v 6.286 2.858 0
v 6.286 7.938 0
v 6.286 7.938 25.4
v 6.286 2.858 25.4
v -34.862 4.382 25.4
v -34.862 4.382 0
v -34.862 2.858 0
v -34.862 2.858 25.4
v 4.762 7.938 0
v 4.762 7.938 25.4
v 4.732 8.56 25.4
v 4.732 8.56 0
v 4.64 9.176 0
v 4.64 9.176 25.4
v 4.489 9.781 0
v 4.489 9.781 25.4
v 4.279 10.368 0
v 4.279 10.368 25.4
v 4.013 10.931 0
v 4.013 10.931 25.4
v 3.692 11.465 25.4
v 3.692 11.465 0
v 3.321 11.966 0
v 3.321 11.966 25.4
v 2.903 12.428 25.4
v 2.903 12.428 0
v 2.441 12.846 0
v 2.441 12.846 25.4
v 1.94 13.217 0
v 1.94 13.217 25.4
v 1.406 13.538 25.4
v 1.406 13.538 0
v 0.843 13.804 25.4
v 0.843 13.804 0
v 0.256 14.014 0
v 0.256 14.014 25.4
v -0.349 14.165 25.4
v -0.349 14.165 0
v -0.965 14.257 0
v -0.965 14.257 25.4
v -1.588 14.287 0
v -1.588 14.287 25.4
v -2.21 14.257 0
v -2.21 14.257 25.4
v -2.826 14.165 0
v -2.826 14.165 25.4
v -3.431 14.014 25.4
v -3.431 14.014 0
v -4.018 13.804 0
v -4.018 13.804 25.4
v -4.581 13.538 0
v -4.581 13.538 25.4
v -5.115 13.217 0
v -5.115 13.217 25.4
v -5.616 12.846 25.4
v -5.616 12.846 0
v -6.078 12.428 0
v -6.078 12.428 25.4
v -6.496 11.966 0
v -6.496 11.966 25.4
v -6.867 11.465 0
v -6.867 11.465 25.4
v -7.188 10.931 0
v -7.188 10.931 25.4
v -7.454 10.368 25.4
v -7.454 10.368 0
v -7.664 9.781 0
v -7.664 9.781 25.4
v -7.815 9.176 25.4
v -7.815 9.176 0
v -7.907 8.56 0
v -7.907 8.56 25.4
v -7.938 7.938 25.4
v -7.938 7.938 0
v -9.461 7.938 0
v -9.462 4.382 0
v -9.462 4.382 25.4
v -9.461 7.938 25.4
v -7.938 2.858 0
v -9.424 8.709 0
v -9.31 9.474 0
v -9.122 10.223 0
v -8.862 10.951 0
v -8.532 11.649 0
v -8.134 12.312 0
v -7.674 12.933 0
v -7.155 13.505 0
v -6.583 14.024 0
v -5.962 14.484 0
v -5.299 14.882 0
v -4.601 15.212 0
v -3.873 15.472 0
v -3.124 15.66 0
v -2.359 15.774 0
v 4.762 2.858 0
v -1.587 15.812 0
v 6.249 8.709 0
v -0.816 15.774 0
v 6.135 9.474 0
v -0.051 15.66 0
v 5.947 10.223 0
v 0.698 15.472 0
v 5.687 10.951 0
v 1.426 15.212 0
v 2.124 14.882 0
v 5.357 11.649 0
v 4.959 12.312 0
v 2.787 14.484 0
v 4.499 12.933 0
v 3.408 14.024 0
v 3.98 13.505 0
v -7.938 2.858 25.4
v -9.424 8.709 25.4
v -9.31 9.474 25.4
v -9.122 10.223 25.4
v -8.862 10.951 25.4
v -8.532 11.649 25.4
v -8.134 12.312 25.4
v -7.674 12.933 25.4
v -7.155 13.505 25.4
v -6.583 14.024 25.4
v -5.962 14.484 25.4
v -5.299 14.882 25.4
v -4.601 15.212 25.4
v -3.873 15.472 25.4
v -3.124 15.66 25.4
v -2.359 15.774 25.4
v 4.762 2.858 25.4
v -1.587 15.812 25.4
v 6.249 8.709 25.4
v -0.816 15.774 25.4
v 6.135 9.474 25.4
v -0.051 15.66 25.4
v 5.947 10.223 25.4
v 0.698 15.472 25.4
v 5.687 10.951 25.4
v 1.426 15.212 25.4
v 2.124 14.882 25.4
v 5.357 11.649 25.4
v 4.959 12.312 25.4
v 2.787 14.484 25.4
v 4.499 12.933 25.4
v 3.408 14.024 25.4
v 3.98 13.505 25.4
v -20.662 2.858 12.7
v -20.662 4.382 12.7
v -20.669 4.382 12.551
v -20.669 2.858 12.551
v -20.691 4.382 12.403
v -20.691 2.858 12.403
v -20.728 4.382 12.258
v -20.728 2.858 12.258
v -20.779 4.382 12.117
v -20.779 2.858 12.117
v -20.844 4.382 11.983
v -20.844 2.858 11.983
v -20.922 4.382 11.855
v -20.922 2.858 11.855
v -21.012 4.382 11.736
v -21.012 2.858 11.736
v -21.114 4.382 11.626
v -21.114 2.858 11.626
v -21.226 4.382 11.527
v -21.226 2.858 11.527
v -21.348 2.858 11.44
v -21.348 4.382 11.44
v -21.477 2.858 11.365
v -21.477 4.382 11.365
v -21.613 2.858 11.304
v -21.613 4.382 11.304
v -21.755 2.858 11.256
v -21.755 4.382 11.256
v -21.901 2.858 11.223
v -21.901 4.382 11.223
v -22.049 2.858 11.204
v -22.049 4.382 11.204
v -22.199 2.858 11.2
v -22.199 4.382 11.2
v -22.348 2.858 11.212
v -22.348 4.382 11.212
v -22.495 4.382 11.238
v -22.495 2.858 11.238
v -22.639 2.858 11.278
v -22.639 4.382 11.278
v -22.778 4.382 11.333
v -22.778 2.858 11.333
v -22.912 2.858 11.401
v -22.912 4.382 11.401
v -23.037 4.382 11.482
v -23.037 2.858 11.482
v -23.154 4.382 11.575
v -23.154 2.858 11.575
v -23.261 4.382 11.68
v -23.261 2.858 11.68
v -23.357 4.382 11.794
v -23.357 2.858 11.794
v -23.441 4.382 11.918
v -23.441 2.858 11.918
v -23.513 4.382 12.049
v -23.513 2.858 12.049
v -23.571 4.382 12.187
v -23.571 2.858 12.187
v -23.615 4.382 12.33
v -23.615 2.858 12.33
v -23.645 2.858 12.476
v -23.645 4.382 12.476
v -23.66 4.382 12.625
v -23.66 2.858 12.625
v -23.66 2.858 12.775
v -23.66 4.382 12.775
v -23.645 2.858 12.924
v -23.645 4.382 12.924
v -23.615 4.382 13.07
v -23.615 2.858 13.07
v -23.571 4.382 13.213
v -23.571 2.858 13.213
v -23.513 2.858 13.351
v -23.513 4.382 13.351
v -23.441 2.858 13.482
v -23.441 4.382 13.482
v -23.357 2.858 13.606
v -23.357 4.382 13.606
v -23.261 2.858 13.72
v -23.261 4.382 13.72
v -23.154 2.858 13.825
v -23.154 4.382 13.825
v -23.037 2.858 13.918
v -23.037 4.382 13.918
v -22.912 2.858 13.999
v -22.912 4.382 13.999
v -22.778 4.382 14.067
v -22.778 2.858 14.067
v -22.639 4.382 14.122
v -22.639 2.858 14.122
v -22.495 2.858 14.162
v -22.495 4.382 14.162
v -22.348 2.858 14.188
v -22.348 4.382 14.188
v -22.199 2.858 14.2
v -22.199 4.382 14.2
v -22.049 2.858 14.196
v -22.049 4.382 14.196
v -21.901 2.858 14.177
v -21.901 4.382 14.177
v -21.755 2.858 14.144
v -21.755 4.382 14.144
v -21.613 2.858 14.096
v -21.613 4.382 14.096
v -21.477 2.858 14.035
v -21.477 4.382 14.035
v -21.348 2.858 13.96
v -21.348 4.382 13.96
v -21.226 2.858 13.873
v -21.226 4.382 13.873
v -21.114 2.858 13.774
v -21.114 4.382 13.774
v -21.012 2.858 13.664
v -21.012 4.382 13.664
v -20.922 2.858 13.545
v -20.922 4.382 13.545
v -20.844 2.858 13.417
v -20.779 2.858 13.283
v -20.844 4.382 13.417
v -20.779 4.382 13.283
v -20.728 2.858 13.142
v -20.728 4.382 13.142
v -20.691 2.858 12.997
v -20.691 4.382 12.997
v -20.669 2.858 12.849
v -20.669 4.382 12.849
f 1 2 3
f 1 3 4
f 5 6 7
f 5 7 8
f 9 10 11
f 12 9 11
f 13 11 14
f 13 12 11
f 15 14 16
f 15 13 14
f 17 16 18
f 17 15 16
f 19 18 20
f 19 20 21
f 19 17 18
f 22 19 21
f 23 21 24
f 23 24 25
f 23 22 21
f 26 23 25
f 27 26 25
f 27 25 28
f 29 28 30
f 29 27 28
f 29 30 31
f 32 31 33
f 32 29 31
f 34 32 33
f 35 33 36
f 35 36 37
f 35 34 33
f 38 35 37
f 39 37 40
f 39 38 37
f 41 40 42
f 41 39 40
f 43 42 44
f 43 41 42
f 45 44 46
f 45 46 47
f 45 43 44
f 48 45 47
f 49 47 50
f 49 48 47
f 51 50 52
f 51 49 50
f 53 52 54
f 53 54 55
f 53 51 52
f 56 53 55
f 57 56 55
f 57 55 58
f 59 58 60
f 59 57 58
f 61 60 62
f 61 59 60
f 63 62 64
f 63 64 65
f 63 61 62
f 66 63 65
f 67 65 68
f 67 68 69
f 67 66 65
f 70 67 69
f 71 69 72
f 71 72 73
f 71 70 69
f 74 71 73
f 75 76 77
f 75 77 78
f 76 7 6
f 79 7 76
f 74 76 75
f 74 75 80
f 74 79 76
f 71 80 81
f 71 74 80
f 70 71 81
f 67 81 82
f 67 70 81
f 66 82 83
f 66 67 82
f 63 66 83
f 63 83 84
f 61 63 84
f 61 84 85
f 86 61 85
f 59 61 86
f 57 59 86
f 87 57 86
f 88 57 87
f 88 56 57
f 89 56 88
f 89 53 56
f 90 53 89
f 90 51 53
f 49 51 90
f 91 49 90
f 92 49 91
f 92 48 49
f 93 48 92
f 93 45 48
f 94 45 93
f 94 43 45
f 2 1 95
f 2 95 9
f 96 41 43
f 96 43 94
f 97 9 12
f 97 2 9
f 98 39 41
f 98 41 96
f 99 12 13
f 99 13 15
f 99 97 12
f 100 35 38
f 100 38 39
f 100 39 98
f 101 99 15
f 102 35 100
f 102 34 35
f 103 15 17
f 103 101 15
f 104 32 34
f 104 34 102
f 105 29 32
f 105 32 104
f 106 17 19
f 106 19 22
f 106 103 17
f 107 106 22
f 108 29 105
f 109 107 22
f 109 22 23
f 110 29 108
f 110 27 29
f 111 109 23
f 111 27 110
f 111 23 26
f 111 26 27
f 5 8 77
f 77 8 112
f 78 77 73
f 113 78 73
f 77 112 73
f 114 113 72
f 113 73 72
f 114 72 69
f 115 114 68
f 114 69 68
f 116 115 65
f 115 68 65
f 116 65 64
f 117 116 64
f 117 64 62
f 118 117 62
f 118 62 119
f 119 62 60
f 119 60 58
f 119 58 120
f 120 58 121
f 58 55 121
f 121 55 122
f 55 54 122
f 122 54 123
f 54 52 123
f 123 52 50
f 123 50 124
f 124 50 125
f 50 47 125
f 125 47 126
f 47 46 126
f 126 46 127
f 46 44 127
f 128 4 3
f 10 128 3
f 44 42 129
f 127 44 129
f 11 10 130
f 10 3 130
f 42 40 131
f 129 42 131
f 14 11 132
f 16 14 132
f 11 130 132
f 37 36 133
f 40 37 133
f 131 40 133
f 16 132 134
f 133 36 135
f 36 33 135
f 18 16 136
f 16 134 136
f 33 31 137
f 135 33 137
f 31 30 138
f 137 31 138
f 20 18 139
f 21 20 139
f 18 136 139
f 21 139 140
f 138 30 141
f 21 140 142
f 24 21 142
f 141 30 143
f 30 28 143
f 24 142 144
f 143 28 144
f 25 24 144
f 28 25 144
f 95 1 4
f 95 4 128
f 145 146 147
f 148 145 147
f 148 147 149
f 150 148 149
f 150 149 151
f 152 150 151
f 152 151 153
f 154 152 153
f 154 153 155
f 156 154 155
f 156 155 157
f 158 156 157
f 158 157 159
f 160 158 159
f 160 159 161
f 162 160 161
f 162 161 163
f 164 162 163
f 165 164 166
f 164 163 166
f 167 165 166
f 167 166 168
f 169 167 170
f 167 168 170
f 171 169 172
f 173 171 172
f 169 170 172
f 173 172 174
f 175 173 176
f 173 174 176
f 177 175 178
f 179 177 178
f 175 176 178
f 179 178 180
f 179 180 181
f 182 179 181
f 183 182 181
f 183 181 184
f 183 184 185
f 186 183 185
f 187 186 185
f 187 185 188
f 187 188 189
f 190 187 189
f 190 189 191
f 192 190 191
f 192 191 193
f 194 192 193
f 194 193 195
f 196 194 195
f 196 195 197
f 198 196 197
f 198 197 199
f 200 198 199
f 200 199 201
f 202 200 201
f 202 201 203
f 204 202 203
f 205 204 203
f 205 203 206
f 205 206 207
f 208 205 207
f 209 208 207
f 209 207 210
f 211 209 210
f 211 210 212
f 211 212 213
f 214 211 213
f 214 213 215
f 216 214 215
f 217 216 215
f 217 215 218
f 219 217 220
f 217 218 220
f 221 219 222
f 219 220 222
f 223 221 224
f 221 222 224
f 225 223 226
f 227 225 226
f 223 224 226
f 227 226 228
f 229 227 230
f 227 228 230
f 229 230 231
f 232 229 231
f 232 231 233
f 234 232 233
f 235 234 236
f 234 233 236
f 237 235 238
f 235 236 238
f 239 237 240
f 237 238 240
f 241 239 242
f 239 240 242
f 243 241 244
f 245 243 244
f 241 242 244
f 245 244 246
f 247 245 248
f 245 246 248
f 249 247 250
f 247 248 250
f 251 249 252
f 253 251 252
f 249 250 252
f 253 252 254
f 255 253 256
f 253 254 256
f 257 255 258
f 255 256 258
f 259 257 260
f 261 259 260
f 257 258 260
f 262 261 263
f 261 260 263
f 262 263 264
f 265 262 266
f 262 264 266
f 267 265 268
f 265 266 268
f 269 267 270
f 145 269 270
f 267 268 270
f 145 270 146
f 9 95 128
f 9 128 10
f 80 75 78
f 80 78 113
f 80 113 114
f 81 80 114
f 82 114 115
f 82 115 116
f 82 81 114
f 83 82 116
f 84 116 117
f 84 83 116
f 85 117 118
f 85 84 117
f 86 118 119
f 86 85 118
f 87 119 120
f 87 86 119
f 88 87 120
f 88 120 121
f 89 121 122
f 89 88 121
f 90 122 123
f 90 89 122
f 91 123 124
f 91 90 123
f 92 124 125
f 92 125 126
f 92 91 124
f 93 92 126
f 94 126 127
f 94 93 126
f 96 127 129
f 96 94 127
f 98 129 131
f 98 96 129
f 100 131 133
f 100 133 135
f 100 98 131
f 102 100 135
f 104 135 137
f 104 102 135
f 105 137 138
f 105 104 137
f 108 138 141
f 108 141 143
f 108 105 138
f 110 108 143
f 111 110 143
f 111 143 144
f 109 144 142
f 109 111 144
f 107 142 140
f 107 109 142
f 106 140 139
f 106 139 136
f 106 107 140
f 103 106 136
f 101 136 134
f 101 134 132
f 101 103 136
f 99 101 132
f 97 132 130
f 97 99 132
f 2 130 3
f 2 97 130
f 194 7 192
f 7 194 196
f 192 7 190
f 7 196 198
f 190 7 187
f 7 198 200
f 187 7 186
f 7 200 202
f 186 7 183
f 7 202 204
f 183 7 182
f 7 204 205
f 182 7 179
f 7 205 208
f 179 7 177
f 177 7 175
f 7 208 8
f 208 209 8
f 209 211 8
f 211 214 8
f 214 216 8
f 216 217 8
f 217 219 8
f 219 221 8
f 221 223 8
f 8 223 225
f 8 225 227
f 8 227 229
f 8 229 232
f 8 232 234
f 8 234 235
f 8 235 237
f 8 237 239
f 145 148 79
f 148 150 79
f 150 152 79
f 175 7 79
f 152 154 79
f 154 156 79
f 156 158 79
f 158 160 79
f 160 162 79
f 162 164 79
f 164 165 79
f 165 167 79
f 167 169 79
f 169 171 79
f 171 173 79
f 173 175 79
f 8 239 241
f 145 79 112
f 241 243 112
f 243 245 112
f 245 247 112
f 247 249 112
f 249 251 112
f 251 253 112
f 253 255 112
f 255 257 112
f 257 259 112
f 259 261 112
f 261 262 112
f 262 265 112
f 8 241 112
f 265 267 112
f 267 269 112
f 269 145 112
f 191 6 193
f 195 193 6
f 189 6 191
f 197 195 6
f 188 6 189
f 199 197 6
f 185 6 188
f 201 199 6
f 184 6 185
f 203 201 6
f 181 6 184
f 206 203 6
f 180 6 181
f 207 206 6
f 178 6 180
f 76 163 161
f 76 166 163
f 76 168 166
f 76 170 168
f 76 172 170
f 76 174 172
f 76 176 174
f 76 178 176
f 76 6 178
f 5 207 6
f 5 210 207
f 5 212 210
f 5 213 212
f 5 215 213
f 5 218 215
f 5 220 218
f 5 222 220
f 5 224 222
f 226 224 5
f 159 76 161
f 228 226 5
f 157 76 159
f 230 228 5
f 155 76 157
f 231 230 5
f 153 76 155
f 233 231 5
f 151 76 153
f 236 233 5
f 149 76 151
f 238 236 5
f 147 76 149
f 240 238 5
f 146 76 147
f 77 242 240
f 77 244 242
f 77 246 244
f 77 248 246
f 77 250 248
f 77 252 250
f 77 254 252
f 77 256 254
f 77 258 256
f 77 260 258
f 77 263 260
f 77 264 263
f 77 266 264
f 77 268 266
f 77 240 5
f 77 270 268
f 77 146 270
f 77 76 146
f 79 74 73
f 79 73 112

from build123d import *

# Parameters (mm, degrees)
BOSS_EXTRUDE1_DEPTH = 25.4
SKETCH2_W           = 25.4
SKETCH2_H           = 1.524
BOSS_EXTRUDE2_DEPTH = 25.4
SKETCH5_R           = 1.5
CUT_EXTRUDE1_DEPTH  = 2.54


with BuildPart() as part:
    # Sketch1 → Boss-Extrude1 (new body)
    with BuildSketch(Plane(origin=(0, 0, 0), x_dir=(-1, 0, 0), z_dir=(0, 0, -1))):
        with BuildLine():
            Line((7.9375, 2.8575), (9.4615, 2.8575))
            Line((9.4615, 2.8575), (9.4615, 7.9375))
            ThreePointArc((9.4615, 7.9375), (1.5875, 15.8115), (-6.2865, 7.9375))
            Line((-6.2865, 7.9375), (-6.2865, 2.8575))
            Line((-6.2865, 2.8575), (-4.7625, 2.8575))
            Line((-4.7625, 2.8575), (-4.7625, 7.9375))
            ThreePointArc((-4.7625, 7.9375), (1.5875, 14.2875), (7.9375, 7.9375))
            Line((7.9375, 7.9375), (7.9375, 2.8575))
        make_face()
    extrude(amount=-BOSS_EXTRUDE1_DEPTH)

    # Sketch2 → Boss-Extrude2 (add)
    with BuildSketch(Plane.ZY.offset(9.4615)):
        with Locations((12.7, 3.6195)):
            Rectangle(SKETCH2_W, SKETCH2_H)
    extrude(amount=BOSS_EXTRUDE2_DEPTH)

    # Sketch5 → Cut-Extrude1 (cut)
    with BuildSketch(Plane(origin=(0, 4.3815, 0), x_dir=(1, 0, 0), z_dir=(0, 1, 0))):
        with Locations((-22.1615, -12.7)):
            Circle(SKETCH5_R)
    extrude(amount=-CUT_EXTRUDE1_DEPTH, mode=Mode.SUBTRACT)


solid = part.part
